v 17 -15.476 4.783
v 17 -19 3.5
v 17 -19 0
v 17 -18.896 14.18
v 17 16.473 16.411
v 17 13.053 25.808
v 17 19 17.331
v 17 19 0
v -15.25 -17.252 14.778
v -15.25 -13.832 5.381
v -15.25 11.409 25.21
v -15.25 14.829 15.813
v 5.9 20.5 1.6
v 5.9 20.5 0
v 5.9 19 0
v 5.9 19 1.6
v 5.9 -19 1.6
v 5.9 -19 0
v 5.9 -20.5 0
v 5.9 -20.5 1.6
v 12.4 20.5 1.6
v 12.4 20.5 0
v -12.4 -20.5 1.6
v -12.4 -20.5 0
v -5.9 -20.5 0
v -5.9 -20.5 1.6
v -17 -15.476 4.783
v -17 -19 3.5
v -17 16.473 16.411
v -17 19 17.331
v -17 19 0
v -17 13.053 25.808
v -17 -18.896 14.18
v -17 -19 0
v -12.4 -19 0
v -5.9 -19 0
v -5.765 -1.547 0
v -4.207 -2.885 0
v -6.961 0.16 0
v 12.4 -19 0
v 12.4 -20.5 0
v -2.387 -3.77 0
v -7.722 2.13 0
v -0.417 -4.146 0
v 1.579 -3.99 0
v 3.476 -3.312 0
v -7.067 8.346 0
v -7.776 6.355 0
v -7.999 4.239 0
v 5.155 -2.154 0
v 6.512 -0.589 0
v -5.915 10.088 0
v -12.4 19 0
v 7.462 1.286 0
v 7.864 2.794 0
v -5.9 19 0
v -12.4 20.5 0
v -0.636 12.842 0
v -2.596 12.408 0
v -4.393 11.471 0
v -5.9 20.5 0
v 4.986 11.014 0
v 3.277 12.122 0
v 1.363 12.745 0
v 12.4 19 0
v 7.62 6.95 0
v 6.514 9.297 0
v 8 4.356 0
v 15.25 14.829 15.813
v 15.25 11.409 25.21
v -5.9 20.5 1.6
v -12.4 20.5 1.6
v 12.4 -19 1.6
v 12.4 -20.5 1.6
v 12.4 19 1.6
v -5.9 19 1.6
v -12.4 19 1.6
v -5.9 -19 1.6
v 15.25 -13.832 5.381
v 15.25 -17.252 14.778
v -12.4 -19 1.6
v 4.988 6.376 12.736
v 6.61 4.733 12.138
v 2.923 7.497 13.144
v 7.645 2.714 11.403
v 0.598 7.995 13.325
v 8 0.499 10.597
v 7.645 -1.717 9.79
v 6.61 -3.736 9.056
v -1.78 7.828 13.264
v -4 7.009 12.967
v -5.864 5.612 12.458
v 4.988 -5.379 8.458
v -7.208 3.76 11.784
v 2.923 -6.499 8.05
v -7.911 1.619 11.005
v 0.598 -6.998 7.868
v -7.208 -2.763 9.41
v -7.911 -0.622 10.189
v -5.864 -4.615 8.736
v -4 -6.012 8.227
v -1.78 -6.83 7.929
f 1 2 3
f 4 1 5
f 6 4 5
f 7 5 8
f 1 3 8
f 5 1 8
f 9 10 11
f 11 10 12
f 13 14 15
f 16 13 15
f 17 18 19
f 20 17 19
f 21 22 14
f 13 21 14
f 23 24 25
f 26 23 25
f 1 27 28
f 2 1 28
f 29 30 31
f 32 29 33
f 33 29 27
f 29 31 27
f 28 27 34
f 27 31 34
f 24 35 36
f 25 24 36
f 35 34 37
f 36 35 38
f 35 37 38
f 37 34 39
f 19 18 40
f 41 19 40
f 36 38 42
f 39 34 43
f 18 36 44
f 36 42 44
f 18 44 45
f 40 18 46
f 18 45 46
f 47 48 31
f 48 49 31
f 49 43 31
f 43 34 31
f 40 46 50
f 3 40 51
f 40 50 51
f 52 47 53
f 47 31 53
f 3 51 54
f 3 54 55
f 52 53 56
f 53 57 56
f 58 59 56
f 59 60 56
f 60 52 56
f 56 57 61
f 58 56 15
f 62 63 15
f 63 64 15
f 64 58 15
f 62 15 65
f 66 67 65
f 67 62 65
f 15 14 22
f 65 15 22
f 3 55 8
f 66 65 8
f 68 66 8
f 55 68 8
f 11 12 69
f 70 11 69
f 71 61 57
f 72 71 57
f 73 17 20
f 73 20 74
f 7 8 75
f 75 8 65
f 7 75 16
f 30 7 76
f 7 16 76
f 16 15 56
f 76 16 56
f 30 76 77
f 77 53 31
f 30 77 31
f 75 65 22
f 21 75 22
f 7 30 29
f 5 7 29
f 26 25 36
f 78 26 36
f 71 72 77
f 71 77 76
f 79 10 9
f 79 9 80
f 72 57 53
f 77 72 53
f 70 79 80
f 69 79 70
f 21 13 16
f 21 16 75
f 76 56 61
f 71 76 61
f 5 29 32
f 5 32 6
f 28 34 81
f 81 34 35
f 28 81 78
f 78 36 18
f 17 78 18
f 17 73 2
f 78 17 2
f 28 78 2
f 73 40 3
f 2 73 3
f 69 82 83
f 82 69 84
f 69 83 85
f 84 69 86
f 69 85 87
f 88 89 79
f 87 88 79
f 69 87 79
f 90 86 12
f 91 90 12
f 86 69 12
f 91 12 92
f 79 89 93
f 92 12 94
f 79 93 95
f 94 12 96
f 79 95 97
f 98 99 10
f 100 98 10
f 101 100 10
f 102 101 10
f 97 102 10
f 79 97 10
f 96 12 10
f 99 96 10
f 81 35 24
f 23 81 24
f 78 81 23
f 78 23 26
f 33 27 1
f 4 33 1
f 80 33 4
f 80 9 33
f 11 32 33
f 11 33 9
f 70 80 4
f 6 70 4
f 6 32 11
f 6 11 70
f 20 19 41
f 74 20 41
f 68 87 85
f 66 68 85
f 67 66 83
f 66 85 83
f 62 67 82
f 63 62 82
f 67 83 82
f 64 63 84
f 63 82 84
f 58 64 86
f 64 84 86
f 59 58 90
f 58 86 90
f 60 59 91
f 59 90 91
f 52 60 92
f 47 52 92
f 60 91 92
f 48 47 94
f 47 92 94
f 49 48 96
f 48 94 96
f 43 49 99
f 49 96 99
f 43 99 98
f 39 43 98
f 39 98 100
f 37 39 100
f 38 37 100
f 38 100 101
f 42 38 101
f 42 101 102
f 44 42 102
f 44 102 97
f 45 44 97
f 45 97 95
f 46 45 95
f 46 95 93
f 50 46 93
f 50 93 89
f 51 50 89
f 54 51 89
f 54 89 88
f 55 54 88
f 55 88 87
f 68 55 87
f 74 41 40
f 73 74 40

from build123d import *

# Parameters (mm, degrees)
F1_DEPTH = 1.6
F3_DEPTH = 20
F5_DEPTH = 34.001
F6_W     = 34
F6_H     = 34
F6_W_2   = 30.5
F6_H_2   = 30.5
F7_DEPTH = 10
F6_R     = 8
F8_DEPTH = 16.7997198341


# Not quite as in the source:
# - a feature names something its author has since deleted; it is built from what else it names


with BuildPart() as f1:
    # F0 (on Top) → F1 (new body)
    with BuildSketch(Plane.XY):
        Polygon((-12.4, 19), (-17, 19), (-17, -19), (-12.4, -19), (-12.4, -20.5), (-5.9, -20.5), (-5.9, -19), (5.9, -19), (5.9, -20.5), (12.4, -20.5), (12.4, -19), (17, -19), (17, 19), (12.4, 19), (12.4, 20.5), (5.9, 20.5), (5.9, 19), (-5.9, 19), (-5.9, 20.5), (-12.4, 20.5), align=None)
    extrude(amount=F1_DEPTH)

    # F2 (on face) → F3 (join)
    with BuildSketch(Plane.XY.offset(1.6)):
        Polygon((-12.4, 19), (-17, 19), (-17, -19), (-12.4, -19), (-5.9, -19), (5.9, -19), (12.4, -19), (17, -19), (17, 19), (12.4, 19), (5.9, 19), (-5.9, 19), align=None)
    extrude(amount=F3_DEPTH)

    # F4 (on face) → F5 (cut, through all)
    with BuildSketch(Plane(origin=(-17, 0, 0), x_dir=(0, -1, 0), z_dir=(-1, 0, 0))):
        Polygon((-19, 17.3308689021), (19, 3.5), (19, 21.6), (-19, 21.6), align=None)
    extrude(amount=-F5_DEPTH, mode=Mode.SUBTRACT)

    # F6 (on face) → F7 (join)
    with BuildSketch(Plane(origin=(0, -3.3474561073, 9.1970600675), x_dir=(1, 0, 0), z_dir=(0, -0.3420201433, 0.9396926208))):
        with Locations((0, 4.0929107067)):
            Rectangle(F6_W, F6_H)
        with Locations((0, 4.0929107067)):
            Rectangle(F6_W_2, F6_H_2, mode=Mode.SUBTRACT)
    extrude(amount=F7_DEPTH)

    # F6 (on face) → F8 (cut, through all)
    with BuildSketch(Plane(origin=(0, -3.3474561073, 9.1970600675), x_dir=(1, 0, 0), z_dir=(0, -0.3420201433, 0.9396926208))):
        with Locations((0, 4.0929107067)):
            Circle(F6_R)
    extrude(amount=-F8_DEPTH, mode=Mode.SUBTRACT)


solid = f1.part
